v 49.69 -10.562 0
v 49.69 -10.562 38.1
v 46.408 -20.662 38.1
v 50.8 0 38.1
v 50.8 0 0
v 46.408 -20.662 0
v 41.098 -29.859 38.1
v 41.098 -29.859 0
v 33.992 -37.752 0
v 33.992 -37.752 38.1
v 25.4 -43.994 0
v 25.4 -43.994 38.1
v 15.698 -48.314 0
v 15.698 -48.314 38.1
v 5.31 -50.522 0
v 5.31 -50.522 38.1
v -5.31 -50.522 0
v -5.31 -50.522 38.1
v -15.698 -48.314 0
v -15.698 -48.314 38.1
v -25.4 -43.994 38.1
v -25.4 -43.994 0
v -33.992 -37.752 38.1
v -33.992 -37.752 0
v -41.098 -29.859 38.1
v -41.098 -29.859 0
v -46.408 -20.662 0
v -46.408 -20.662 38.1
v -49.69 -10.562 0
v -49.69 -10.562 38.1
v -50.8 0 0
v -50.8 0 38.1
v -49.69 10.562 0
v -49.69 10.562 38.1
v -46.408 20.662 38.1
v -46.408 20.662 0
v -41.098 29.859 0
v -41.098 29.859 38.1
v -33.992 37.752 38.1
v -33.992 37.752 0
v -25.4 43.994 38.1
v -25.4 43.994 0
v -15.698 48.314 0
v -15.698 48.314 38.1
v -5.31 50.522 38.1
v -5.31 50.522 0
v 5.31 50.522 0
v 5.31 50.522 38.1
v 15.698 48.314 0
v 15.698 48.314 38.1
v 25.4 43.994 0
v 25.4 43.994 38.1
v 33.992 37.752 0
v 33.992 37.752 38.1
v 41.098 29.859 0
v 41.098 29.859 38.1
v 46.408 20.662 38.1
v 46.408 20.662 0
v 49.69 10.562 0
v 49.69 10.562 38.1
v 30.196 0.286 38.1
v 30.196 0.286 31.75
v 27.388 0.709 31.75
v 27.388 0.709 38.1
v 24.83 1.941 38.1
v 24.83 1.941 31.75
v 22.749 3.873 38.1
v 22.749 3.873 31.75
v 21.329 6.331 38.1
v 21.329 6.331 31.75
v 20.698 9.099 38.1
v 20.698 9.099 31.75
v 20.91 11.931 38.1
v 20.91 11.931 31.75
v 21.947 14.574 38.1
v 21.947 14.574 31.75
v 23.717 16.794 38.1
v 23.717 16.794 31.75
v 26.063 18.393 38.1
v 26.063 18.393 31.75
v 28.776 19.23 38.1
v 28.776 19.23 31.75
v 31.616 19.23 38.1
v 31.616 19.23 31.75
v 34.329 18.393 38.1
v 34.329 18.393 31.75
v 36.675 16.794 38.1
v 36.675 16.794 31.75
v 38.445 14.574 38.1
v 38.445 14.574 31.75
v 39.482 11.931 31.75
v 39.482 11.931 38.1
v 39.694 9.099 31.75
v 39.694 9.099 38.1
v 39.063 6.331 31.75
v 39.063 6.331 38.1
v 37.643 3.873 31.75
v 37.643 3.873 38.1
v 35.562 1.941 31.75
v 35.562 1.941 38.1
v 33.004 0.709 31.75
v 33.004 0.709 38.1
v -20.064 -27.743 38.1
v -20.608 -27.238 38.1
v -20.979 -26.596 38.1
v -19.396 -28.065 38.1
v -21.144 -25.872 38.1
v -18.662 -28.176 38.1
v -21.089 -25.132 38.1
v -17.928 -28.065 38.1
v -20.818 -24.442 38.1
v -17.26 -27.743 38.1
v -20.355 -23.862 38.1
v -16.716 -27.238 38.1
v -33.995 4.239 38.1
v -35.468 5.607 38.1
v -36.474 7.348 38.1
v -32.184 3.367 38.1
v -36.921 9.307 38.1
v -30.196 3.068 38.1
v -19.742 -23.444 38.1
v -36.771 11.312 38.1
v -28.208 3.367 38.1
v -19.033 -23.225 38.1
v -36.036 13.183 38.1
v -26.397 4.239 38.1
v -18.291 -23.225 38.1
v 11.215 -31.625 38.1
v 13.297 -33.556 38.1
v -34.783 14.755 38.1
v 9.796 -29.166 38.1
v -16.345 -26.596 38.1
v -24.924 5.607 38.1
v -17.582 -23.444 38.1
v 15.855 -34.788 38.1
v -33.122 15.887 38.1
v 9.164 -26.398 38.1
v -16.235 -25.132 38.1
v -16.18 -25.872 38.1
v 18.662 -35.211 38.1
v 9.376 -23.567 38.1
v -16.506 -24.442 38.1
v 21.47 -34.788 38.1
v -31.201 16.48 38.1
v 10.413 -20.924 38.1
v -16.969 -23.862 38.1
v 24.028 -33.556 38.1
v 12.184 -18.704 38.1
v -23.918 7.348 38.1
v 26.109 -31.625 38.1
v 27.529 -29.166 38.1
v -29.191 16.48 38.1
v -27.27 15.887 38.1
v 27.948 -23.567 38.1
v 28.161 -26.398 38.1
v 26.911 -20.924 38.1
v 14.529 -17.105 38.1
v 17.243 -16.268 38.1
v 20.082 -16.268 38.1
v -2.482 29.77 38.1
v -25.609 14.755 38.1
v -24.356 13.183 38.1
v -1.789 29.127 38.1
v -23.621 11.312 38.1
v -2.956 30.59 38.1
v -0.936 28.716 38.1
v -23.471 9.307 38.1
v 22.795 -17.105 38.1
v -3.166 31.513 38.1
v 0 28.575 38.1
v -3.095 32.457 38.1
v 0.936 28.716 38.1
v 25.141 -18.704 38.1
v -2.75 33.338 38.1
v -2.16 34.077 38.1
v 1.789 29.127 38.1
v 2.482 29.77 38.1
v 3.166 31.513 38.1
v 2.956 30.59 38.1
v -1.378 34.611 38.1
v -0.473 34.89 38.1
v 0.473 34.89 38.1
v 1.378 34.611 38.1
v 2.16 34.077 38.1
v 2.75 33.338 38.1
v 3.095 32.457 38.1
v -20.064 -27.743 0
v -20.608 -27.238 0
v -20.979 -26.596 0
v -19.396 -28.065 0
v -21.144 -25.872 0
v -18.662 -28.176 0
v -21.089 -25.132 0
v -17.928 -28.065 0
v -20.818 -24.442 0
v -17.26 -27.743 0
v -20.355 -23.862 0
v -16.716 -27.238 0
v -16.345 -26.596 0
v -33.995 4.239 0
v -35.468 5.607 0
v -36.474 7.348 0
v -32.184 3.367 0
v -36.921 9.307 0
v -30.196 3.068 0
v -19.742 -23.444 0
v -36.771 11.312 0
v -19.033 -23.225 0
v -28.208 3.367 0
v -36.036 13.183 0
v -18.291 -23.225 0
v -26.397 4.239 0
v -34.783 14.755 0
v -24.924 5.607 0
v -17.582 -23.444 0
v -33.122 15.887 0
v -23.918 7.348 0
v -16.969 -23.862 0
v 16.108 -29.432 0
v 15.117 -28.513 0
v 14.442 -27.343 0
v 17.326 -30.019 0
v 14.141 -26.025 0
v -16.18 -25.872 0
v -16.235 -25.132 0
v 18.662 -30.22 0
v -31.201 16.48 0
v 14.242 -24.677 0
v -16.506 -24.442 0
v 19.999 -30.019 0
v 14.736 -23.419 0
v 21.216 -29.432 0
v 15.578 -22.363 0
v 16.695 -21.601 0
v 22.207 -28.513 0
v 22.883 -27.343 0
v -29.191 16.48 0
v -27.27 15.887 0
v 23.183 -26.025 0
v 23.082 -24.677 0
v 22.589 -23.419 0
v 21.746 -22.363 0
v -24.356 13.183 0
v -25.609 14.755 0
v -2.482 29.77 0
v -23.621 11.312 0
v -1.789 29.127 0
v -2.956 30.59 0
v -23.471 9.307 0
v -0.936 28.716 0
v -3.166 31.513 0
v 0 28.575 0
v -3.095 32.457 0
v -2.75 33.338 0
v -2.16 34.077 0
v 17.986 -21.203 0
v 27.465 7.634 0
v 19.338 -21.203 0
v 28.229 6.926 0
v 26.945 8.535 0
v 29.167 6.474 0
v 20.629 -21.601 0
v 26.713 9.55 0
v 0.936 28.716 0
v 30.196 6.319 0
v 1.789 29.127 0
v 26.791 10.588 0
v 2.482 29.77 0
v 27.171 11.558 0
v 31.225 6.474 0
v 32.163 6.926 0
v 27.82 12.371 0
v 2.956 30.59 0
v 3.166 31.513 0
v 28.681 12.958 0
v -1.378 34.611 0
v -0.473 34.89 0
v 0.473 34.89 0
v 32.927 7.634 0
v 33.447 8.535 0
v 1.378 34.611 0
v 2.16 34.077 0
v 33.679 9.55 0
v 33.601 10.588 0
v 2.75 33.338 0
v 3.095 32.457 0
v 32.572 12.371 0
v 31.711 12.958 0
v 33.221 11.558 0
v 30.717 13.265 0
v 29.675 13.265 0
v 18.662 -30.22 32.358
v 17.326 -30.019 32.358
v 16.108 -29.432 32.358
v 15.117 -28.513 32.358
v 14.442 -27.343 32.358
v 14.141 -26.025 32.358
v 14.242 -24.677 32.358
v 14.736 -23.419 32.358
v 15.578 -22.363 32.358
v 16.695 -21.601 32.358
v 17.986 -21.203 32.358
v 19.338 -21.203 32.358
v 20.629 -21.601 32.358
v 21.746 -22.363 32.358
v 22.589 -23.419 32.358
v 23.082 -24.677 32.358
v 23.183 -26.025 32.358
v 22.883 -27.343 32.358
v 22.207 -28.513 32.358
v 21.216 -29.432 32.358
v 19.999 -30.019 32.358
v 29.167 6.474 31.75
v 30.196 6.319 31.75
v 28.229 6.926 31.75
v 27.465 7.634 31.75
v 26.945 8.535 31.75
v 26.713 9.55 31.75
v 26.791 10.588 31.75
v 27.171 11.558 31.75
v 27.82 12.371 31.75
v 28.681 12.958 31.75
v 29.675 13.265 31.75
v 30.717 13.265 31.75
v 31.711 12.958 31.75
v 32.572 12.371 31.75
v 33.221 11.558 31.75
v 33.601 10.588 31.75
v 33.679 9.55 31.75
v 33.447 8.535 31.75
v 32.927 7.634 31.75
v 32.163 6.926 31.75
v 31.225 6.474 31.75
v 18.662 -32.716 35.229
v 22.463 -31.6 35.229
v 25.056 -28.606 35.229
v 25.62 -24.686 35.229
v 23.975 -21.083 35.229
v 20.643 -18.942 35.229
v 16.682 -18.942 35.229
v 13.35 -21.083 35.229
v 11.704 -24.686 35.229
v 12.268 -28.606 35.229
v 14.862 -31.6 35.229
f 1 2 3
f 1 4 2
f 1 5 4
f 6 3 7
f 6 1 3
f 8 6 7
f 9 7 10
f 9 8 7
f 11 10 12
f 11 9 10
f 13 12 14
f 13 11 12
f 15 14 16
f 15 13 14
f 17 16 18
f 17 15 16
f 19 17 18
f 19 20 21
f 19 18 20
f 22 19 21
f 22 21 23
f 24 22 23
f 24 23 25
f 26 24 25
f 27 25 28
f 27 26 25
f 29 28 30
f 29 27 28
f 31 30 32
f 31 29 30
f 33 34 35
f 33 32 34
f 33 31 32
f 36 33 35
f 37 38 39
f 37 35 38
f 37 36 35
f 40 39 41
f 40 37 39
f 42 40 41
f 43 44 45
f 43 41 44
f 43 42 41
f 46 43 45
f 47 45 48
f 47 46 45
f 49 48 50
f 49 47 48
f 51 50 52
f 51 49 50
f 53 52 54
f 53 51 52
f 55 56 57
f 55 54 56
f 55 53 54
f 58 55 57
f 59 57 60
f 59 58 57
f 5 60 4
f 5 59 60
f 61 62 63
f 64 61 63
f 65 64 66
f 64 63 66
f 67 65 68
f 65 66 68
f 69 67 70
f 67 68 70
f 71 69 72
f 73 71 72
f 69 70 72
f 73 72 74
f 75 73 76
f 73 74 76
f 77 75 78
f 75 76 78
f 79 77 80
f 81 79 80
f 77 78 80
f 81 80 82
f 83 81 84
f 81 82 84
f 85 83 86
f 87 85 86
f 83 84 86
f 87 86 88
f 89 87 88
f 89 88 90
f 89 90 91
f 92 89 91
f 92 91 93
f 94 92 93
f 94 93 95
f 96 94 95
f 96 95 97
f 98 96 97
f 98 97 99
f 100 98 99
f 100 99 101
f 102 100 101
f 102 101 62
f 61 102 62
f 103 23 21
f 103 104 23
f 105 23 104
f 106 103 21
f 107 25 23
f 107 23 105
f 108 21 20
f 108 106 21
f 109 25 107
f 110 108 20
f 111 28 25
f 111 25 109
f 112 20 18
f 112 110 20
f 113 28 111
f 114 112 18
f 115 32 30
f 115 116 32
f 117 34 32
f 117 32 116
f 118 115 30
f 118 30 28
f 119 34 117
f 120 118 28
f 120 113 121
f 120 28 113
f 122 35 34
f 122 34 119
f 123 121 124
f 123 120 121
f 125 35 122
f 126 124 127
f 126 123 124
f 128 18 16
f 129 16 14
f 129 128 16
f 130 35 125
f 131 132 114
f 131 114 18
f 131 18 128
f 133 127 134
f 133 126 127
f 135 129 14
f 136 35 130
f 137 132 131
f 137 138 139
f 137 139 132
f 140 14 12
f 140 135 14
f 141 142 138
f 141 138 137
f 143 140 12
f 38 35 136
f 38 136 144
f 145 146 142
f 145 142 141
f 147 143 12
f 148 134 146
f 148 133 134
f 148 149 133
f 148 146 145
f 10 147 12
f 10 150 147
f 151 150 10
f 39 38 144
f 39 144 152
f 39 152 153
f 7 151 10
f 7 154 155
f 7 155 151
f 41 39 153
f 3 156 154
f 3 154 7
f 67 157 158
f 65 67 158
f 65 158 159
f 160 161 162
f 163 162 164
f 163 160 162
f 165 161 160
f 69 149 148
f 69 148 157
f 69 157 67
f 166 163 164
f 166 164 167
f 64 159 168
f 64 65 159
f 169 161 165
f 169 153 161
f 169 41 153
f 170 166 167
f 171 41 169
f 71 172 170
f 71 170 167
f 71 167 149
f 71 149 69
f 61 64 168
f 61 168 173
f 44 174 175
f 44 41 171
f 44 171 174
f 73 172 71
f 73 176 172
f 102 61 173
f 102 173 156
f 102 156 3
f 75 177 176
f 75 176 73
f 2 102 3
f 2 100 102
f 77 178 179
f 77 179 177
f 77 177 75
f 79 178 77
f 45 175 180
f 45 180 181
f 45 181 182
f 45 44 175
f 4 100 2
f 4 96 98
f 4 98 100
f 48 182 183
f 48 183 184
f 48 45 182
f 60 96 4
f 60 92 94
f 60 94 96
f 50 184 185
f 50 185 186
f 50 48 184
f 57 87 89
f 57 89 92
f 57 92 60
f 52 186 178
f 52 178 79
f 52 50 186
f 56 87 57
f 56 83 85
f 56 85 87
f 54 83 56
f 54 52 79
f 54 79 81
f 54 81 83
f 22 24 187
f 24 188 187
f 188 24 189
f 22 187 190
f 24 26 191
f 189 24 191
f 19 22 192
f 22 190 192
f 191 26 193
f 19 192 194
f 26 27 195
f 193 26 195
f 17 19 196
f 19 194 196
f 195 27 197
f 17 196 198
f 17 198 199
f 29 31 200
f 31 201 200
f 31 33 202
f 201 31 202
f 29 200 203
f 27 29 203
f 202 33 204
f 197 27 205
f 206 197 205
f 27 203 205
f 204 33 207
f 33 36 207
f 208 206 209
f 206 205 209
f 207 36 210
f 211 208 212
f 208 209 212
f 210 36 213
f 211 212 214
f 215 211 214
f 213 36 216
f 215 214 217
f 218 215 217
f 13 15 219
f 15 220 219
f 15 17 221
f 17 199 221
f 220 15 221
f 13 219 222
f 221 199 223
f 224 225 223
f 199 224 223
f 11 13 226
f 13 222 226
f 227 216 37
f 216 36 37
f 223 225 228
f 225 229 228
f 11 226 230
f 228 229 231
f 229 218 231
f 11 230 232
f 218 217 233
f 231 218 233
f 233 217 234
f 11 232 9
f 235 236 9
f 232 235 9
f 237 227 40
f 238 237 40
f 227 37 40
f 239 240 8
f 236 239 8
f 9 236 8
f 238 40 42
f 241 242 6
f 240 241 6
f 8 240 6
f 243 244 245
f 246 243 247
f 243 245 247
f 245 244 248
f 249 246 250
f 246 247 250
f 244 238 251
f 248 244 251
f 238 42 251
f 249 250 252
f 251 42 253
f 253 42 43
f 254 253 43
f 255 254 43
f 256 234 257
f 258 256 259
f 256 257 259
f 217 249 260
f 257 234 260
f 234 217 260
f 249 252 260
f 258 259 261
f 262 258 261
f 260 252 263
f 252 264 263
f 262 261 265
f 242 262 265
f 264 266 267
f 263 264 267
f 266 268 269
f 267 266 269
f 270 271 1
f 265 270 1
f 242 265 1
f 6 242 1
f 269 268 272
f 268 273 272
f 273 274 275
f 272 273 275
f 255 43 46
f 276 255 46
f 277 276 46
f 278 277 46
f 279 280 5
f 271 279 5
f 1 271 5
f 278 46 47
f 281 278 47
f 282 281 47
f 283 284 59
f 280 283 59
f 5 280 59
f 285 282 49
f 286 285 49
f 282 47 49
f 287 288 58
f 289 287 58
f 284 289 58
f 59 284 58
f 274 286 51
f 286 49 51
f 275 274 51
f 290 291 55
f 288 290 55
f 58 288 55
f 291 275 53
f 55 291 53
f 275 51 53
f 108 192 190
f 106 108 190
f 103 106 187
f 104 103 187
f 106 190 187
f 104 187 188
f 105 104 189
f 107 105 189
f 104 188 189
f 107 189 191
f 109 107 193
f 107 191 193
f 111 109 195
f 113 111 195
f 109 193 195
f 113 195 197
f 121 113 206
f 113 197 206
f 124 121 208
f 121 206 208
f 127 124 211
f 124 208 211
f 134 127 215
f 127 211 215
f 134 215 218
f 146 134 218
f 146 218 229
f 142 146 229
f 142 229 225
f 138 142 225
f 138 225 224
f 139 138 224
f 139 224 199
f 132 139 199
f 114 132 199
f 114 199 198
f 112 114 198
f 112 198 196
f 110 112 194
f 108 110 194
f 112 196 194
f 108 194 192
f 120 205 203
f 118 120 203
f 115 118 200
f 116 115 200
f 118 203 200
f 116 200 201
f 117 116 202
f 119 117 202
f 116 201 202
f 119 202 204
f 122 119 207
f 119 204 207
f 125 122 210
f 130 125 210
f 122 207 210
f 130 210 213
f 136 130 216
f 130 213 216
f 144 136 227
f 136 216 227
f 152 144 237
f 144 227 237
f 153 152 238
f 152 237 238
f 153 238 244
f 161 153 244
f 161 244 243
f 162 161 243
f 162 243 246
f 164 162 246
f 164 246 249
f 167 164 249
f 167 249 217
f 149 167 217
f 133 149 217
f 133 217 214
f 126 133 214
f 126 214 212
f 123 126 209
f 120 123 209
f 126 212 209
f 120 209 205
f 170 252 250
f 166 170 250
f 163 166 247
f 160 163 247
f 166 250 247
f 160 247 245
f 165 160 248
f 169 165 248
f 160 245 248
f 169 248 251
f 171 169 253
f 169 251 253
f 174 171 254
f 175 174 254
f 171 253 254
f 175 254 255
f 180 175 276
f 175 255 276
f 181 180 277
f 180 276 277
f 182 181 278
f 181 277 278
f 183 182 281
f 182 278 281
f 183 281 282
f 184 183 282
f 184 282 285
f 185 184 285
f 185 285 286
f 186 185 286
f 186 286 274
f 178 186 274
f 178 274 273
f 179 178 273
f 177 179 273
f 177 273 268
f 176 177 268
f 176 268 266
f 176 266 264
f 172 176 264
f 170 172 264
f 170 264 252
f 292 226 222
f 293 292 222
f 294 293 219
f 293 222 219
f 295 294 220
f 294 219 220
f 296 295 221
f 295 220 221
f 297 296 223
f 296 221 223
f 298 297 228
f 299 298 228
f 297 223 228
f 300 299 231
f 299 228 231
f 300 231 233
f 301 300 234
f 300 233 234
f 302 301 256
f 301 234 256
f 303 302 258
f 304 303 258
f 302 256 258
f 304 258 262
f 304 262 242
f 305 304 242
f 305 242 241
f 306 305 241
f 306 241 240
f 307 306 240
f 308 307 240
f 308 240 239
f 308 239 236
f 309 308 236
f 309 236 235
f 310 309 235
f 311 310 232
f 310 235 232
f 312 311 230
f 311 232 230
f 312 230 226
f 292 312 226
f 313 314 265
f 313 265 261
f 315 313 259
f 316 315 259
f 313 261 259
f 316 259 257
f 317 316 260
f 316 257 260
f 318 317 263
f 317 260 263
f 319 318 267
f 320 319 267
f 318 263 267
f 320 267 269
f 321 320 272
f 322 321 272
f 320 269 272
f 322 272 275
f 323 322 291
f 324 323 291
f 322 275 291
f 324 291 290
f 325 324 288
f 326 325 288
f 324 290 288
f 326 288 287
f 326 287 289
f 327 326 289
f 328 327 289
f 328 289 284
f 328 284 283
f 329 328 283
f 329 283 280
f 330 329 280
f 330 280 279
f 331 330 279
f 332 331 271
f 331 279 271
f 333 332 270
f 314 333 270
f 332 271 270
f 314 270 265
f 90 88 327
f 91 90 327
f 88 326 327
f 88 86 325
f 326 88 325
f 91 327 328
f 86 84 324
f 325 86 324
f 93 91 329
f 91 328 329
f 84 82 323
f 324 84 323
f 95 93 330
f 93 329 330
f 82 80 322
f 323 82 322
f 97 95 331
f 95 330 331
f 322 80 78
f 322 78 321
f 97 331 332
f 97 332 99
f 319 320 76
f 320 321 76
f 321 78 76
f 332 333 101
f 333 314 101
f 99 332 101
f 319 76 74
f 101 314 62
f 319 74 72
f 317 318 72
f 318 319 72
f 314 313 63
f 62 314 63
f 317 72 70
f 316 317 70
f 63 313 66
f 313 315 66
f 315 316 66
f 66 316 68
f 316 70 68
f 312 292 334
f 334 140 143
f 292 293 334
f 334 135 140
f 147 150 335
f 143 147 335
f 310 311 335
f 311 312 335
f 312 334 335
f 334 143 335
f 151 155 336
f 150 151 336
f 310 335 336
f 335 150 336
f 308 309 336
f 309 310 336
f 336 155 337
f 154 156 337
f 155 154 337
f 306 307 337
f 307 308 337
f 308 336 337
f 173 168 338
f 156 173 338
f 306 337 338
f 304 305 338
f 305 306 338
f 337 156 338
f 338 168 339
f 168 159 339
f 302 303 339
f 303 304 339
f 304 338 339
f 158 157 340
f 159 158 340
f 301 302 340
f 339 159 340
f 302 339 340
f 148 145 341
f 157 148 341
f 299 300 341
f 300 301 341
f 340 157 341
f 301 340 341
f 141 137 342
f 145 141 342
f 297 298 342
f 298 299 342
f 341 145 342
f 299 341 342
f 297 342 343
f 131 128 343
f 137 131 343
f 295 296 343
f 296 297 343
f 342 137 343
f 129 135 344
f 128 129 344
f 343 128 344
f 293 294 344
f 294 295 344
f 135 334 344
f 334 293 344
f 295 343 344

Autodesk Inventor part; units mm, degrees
ref_plane "YZ Plane" through (0, 0, 0) normal (1, 0, 0) x (0, 1, 0)
ref_plane "XZ Plane" through (0, 0, 0) normal (0, 1, 0) x (-1, 0, 0)
ref_plane "XY Plane" through (0, 0, 0) normal (0, 0, 1) x (1, 0, 0)
sketch "Sketch1" plane through (0, 0, 0) normal (0, 0, 1) x (1, 0, 0)
  circle A0 centre (0, 0) radius 50.8
extrude "Extrusion1" add sketch "Sketch1" along normal blind 38.1
sketch "Sketch2" plane through (0, 0, 38.1) normal (0, 0, 1) x (1, 0, 0)
  circle A0 centre (0, 0) radius 31.75 construction
  circle A1 centre (0, 0) radius 31.75 construction
  circle A2 centre (0, 0) radius 31.75 construction
  circle A3 centre (0, 0) radius 31.75 construction
  circle A4 centre (0, 0) radius 31.75 construction
  point P0 (0, 31.75)
  point P1 (-30.196, 9.8113)
  point P2 (-18.6622, -25.6863)
  point P3 (18.6622, -25.6863)
  point P4 (30.196, 9.8113)
  dimension "d8" = 63.5
  dimension "d11" = 360
hole "Hole1" at (0, 31.75, 38.1) direction (0, 0, -1) diameter 6.35 depth 38.1 tip angle 118
hole "Hole2" at (30.196, 9.8113, 38.1) direction (0, 0, -1) diameter 6.985 depth 38.1 tip angle 118 counterbore diameter 19.05 counterbore depth 6.35
hole "Hole3" at (18.6622, -25.6863, 38.1) direction (0, 0, -1) diameter 9.0678 end through all countersink diameter 19.05 countersink angle 82
hole "Hole4" at (-18.6622, -25.6863, 38.1) direction (0, 0, -1) diameter 4.9784 end through all thread size "1/4-20 UNC" class "1B" standard "ANSI Unified Screw Threads"
hole "Hole5" at (-30.196, 9.8113, 38.1) direction (0, 0, -1) diameter 13.4874 end through all clearance for "Hex Head Bolt" size "1/2" standard "Ansi Unified Screw Threads"
properties part number "Hole Practice"
